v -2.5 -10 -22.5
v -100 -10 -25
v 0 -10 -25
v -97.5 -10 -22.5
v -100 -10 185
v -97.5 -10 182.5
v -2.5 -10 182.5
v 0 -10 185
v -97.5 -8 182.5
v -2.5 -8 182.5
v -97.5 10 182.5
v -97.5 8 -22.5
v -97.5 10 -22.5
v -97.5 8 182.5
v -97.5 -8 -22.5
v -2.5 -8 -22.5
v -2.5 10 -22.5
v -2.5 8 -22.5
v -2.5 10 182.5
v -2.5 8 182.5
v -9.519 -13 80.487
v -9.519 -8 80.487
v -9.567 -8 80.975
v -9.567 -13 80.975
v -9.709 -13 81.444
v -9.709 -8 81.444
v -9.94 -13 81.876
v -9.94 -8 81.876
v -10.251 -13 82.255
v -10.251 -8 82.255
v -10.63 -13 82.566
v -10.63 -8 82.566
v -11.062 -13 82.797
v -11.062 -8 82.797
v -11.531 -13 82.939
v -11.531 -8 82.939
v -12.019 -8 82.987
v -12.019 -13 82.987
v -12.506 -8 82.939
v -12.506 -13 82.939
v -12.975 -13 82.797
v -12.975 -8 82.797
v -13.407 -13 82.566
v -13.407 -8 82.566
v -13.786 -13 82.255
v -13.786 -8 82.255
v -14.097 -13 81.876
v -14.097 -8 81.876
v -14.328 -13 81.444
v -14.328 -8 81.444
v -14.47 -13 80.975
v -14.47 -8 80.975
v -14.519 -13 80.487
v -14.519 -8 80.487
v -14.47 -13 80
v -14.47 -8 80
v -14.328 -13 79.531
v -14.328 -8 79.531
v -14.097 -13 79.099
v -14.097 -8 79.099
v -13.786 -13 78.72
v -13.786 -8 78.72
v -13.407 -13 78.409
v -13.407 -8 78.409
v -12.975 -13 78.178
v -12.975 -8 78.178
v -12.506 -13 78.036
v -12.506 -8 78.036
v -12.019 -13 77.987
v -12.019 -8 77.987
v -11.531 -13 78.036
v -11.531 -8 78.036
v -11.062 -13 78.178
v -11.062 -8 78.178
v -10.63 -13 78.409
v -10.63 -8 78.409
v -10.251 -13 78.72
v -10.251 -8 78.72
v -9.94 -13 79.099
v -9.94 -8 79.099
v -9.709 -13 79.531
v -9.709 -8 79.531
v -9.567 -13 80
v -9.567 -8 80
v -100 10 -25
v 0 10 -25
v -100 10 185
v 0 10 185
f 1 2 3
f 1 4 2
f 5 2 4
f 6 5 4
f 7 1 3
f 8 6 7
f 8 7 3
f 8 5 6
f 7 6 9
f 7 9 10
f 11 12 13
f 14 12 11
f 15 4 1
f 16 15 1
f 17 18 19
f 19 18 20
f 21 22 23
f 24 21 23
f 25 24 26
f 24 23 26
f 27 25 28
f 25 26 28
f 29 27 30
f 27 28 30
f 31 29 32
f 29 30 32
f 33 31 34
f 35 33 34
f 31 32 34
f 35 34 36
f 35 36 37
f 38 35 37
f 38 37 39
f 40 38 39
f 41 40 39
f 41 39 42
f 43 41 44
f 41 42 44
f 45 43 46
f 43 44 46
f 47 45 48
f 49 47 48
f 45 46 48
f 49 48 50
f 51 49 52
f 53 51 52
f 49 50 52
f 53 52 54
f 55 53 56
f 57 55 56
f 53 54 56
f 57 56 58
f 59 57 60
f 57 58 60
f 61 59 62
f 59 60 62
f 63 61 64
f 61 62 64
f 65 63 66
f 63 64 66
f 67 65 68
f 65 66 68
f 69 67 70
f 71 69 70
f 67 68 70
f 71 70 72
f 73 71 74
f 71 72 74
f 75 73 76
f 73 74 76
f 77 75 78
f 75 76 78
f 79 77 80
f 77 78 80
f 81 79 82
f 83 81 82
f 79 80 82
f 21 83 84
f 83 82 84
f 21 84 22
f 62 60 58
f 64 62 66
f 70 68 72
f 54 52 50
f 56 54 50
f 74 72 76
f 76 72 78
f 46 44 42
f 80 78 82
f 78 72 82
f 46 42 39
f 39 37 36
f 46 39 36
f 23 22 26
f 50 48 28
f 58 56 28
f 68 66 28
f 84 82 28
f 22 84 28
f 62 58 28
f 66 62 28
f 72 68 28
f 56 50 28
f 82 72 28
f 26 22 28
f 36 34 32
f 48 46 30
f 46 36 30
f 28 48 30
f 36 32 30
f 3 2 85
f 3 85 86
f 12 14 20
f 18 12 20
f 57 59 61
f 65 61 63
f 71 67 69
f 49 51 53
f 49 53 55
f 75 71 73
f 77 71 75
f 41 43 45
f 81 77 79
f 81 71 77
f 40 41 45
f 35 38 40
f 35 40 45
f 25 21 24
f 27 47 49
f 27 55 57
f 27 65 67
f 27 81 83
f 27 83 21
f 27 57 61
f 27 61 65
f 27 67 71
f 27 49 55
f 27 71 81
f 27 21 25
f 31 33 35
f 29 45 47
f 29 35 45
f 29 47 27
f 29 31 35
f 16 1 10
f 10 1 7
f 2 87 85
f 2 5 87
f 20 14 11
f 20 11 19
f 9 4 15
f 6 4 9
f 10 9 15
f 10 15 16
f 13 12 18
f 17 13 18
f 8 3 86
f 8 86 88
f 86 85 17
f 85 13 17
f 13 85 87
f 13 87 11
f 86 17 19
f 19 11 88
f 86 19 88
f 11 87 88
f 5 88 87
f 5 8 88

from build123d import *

# Parameters (mm, degrees)
F0_W          = 95
F0_H          = 205
F1_DEPTH      = 10
F1_DEPTH_BACK = 10
F2_DEPTH      = 8
F2_DEPTH_BACK = 8
F3_R          = 2.5
F4_DEPTH      = 5


with BuildPart() as f1:
    # F0 (on Front) → F1 (new body, two sides)
    with BuildSketch(Plane.XZ) as f1_sk:
        Polygon((-97.5, 185), (-100, 185), (-100, 182.5), (-100, -25), (-2.5, -25), (0, -25), (0, -22.5), (0, 185), align=None)
        with Locations((-50, 80)):
            Rectangle(F0_W, F0_H, mode=Mode.SUBTRACT)
    extrude(amount=F1_DEPTH)
    extrude(f1_sk.sketch, amount=-F1_DEPTH_BACK)

    # F0 (on Front) → F2 (join, two sides)
    with BuildSketch(Plane.XZ) as f2_sk:
        with Locations((-50, 80)):
            Rectangle(F0_W, F0_H)
    extrude(amount=F2_DEPTH)
    extrude(f2_sk.sketch, amount=-F2_DEPTH_BACK)


with BuildPart() as f4:
    # F3 (on face) → F4 (new body)
    with BuildSketch(Plane.XZ.offset(8)):
        with Locations((-12.0185082778, 80.4874971509)):
            Circle(F3_R)
    extrude(amount=F4_DEPTH)


solid = Compound([f1.part, f4.part])
